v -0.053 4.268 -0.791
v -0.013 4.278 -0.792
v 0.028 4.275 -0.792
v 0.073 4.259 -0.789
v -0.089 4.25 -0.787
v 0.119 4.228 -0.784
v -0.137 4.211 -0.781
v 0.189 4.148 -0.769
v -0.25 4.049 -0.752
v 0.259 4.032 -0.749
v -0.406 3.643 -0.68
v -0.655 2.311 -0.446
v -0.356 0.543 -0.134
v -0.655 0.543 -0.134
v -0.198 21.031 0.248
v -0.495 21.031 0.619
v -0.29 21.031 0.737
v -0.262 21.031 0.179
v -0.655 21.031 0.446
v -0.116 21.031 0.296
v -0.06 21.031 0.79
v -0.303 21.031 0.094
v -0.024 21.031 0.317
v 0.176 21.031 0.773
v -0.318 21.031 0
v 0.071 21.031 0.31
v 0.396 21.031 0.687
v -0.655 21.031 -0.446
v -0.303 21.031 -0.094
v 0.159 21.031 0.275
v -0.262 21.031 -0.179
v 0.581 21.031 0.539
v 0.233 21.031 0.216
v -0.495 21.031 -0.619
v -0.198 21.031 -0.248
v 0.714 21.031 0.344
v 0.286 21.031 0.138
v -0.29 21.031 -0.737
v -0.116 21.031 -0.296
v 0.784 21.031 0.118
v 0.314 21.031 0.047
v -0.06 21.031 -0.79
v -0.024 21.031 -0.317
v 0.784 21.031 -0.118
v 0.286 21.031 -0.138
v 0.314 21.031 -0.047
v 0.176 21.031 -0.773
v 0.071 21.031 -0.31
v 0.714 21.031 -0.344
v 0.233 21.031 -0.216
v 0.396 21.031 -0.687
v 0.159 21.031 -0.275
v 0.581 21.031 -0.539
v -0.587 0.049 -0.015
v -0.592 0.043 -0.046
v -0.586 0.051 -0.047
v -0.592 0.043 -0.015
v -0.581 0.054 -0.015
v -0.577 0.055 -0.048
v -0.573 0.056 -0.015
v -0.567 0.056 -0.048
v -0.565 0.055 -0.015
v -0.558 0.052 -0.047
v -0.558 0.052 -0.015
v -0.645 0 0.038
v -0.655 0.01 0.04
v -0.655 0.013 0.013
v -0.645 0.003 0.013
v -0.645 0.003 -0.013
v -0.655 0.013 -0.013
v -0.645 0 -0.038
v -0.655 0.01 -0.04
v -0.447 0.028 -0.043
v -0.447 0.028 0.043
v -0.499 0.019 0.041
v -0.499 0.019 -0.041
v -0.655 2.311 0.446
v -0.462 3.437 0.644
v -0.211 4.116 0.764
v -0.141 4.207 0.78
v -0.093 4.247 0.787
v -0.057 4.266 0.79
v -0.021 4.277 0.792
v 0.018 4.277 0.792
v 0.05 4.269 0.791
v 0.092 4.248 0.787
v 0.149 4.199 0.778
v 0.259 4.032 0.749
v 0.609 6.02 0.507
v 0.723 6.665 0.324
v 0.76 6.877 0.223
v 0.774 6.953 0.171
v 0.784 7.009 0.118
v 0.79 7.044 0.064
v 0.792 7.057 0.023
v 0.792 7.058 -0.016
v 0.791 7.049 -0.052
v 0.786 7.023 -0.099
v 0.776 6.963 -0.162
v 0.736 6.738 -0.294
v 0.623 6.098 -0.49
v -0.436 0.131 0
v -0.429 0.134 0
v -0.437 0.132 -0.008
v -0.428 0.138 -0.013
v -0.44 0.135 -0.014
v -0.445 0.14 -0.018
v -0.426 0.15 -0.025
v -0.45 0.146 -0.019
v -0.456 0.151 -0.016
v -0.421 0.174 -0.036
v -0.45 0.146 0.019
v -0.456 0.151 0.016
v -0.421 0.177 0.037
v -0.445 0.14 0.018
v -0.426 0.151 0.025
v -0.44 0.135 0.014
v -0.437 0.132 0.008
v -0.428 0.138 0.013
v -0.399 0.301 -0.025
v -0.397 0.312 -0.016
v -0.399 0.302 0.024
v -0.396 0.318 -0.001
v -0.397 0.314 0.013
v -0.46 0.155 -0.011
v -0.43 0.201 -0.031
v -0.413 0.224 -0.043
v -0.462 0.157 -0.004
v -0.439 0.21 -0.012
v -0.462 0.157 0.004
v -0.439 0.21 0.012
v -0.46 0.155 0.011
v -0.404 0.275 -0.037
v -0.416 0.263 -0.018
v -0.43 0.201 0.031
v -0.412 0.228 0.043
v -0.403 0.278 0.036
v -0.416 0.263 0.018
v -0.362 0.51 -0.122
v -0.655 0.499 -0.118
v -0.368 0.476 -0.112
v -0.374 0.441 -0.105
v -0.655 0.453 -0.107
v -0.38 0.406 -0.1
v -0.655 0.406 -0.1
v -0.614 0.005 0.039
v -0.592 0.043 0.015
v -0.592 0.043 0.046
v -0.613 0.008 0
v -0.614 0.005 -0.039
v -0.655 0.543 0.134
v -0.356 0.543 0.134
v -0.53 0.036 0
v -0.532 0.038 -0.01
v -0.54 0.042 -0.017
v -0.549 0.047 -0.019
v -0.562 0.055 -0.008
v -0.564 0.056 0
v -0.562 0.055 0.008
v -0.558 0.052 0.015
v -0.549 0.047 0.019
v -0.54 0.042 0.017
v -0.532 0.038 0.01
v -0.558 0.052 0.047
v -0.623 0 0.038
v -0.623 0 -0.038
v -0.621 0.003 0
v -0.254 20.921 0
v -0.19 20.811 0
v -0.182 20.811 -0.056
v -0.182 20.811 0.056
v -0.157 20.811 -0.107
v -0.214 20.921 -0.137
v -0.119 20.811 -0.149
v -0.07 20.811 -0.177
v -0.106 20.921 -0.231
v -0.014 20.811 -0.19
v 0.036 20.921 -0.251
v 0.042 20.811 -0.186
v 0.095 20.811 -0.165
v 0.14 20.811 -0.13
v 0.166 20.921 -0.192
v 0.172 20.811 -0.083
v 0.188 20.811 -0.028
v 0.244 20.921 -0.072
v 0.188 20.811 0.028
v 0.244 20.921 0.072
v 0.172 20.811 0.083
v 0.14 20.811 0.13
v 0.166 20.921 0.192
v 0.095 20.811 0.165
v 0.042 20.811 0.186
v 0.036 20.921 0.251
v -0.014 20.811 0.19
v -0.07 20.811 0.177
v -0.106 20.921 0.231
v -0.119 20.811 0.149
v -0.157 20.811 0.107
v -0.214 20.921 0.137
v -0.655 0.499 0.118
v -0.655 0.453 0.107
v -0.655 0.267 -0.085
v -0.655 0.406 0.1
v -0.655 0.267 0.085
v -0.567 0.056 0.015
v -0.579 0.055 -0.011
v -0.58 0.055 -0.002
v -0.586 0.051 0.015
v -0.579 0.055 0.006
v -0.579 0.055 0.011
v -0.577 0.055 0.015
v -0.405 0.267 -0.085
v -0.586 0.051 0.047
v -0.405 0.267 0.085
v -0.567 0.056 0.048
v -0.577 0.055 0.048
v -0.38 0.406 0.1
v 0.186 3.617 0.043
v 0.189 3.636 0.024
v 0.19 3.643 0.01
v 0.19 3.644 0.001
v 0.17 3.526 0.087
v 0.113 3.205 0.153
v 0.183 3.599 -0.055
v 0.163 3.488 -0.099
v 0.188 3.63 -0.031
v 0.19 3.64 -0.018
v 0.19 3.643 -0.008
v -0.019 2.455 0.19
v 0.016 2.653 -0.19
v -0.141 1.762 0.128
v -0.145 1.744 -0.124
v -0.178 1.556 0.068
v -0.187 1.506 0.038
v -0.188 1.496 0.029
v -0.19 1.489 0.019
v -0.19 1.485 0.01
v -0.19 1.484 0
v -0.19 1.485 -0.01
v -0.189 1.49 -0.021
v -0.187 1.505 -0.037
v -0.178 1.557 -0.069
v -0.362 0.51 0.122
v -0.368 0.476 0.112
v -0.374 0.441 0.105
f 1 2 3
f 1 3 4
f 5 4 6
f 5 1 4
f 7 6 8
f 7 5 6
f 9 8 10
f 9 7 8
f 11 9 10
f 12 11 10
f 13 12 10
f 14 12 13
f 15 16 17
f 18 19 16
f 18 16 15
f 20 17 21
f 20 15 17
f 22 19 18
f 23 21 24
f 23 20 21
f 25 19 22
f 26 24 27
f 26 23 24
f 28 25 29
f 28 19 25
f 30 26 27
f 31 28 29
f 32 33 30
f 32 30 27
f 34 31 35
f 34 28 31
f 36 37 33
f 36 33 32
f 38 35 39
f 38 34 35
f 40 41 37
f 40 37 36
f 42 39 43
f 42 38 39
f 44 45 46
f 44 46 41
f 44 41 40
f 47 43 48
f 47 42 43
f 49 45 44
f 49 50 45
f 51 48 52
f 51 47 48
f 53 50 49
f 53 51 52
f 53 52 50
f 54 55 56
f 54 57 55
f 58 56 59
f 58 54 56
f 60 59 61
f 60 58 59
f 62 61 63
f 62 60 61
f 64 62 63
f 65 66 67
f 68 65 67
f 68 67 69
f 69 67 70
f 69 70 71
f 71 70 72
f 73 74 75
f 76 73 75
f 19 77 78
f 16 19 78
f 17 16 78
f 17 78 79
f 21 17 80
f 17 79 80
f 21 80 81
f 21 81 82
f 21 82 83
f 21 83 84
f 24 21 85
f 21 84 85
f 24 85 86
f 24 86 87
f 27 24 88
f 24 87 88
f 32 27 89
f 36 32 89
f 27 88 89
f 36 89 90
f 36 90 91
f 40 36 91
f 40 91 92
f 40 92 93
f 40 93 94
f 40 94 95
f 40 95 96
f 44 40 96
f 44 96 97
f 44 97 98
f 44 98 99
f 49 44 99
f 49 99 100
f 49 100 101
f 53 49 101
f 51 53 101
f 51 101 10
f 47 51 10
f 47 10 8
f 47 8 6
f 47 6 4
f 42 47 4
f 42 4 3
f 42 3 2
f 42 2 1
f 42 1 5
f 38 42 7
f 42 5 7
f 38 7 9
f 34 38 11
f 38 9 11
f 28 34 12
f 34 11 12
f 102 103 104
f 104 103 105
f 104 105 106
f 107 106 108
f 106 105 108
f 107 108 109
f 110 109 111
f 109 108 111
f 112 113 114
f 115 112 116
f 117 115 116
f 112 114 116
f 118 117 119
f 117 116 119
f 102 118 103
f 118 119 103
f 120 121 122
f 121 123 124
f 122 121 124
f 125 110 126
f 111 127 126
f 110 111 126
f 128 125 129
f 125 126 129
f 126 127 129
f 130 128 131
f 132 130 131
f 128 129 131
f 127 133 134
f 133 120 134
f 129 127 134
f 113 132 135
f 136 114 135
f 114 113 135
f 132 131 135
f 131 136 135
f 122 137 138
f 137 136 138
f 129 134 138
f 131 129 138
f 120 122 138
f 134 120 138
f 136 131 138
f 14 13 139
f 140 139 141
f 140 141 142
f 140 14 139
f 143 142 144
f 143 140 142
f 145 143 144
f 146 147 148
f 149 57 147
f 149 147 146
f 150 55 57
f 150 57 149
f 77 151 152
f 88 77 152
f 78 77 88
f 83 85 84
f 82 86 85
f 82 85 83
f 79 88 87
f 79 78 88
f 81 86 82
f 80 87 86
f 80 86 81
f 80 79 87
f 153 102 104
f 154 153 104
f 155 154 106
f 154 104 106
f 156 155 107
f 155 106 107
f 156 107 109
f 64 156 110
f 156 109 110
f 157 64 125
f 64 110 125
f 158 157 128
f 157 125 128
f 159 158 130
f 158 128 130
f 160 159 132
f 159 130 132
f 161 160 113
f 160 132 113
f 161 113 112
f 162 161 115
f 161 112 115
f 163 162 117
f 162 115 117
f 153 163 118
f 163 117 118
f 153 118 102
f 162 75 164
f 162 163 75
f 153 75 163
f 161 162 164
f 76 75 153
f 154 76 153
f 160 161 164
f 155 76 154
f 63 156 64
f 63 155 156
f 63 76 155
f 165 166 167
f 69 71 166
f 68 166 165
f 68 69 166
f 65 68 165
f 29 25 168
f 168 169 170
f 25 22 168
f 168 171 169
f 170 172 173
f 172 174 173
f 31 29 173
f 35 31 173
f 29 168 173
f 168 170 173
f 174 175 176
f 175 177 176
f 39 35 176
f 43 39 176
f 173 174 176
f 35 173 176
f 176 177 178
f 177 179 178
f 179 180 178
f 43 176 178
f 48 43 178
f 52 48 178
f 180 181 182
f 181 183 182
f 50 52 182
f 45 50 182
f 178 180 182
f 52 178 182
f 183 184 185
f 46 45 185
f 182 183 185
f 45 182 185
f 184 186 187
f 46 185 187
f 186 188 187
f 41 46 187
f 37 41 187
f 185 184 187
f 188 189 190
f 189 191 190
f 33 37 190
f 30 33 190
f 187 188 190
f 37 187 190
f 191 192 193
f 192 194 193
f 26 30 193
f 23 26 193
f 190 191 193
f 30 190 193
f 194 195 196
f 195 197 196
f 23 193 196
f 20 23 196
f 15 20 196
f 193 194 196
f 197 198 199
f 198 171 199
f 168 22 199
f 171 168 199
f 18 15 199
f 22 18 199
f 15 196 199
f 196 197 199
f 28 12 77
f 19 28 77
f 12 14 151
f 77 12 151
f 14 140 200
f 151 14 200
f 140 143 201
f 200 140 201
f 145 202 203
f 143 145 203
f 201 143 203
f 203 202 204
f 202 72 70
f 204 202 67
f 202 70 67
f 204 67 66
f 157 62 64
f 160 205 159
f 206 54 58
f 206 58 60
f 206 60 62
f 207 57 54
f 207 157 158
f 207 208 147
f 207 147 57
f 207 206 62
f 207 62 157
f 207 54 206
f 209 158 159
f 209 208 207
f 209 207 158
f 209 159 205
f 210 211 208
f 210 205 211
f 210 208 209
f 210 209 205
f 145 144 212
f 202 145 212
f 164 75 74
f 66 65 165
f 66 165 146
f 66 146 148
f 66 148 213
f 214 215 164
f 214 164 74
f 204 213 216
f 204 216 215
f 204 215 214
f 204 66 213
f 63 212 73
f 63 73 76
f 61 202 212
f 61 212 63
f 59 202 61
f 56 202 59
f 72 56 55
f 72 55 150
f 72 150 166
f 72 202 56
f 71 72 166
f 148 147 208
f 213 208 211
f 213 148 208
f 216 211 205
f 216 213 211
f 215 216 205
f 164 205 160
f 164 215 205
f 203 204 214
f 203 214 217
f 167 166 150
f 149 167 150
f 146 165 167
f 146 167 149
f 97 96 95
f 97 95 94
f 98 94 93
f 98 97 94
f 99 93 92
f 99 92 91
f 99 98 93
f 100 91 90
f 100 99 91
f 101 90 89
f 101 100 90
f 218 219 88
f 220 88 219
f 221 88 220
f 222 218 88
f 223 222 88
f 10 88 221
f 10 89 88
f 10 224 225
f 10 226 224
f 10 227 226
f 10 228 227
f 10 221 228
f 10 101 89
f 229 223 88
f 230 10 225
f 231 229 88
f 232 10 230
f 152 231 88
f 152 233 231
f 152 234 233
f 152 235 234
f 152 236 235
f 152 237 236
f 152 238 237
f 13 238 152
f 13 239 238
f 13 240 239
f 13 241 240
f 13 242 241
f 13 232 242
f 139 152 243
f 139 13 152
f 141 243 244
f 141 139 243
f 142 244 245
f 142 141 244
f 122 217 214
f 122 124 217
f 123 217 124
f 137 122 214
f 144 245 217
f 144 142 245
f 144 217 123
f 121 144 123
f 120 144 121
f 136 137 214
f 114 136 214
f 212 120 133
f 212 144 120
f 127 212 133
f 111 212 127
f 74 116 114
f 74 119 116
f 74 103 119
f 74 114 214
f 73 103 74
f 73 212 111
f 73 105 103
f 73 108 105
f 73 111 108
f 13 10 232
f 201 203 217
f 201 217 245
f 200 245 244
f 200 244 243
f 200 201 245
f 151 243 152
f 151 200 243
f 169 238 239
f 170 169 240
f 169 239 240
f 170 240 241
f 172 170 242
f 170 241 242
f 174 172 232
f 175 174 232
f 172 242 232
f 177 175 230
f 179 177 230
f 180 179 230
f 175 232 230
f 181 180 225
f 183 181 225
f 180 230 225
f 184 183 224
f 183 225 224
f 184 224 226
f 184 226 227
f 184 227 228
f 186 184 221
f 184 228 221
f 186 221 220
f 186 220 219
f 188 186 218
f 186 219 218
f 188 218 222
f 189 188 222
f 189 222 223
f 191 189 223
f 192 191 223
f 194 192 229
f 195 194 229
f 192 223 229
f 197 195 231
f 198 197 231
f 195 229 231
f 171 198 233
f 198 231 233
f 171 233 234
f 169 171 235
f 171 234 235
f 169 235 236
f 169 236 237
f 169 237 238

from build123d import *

# Parameters (mm, degrees)
TD_STD_FEATURE_DEPTH            = 21.0312
ISA_STD_FEATURE_DEPTH           = 22.061040395498036
ISA_STD_FEATURE_DEPTH_BACK      = 22.061040395498036
BA_STD_FEATURE_DEPTH            = 22.061040395498036
BA_STD_FEATURE_DEPTH_BACK       = 22.061040395498036
VR_STD_FEATURE_DEPTH            = 22.061040395498036
VR_STD_FEATURE_DEPTH_BACK       = 22.061040395498036
ND_STD_FEATURE_DEPTH            = 22.061040395498036
ND_STD_FEATURE_DEPTH_BACK       = 22.061040395498036
HOLE_STD_FEATURE_D              = 0.381
HOLE_STD_FEATURE_CSINK_D        = 0.635
HOLE_STD_FEATURE_CSINK_ANGLE    = 60
STD_HOLE_CUT_FEATURE_DEPTH      = 22.158574025318714
STD_HOLE_CUT_FEATURE_DEPTH_BACK = 22.158574025318714
NR_FEATURE_R                    = 0.0254
STD_C_FEATURE_DEPTH             = 22.061040395498036
STD_C_FEATURE_DEPTH_BACK        = 22.061040395498036
STD_FR_C_FEATURE_R              = 0.01016
STD_BR_C_FEATURE_R              = 0.01016


with BuildPart() as part:
    # td_std_sketch → td_std_feature (new body)
    with BuildSketch(Plane(origin=(0, 0, 0), x_dir=(1, 0, 0), z_dir=(0, 1, 0))):
        with BuildLine():
            Line((-0.65532, 0.4456234374446657), (-0.6553199999999998, -0.44562343744466604))
            ThreePointArc((-0.6553199999999998, -0.44562343744466604), (0.79248, 0), (-0.65532, 0.4456234374446657))
        make_face()
    extrude(amount=TD_STD_FEATURE_DEPTH)

    # isa_std_sketch → isa_std_feature (cut, two sides: drawn at the far end of the back side and taken through both)
    with BuildSketch(Plane(origin=(0, 0, 0), x_dir=(0, 0, -1), z_dir=(1, 0, 0)).offset(-ISA_STD_FEATURE_DEPTH_BACK)):
        Polygon((8.373162888528082, 47.27049062508045), (0.79248, 4.278301579083286), (0.03809999999999999, 0), (-0.03809999999999999, 0), (-0.79248, 4.278301579083286), (-8.373162888528082, 47.27049062508045), (-8.373162888528082, -40.04033509597618), (8.373162888528082, -40.04033509597618), align=None)
    extrude(amount=ISA_STD_FEATURE_DEPTH + ISA_STD_FEATURE_DEPTH_BACK, mode=Mode.SUBTRACT)

    # ba_std_sketch → ba_std_feature (cut, two sides: drawn at the far end of the back side and taken through both)
    with BuildSketch(Plane.XY.offset(-BA_STD_FEATURE_DEPTH_BACK)):
        Polygon((-51.96869655836785, -9.056666233848073), (-0.6057899999999999, 0), (-0.4471889008518133, 0.02796565294984382), (0.79248, 7.0584773526961735), (9.849146233848053, 58.421383911064034), (86.76310584868799, -12.040863498073982), (24.945263056472086, -79.51891364298609), align=None)
    extrude(amount=BA_STD_FEATURE_DEPTH + BA_STD_FEATURE_DEPTH_BACK, mode=Mode.SUBTRACT)

    # vr_std_sketch → vr_std_feature (cut, two sides: drawn at the far end of the back side and taken through both)
    with BuildSketch(Plane(origin=(0, 0, 0), x_dir=(0, 0, -1), z_dir=(1, 0, 0)).offset(-VR_STD_FEATURE_DEPTH_BACK)):
        with BuildLine():
            Line((35.91518958962539, 36.381828135911775), (0.79248, 1.2591185462865075))
            Line((0.79248, 1.2591185462865075), (0.24587123921628848, 0.7125097855027981))
            ThreePointArc((0.24587123921628848, 0.7125097855027981), (0.14656815960932523, 0.5719991778386461), (0.09986436121197133, 0.40640000000000004))
            Line((0.09986436121197133, 0.40640000000000004), (0.05714999999999999, 0))
            Line((0.05714999999999999, 0), (-0.05714999999999999, 0))
            Line((-0.05714999999999999, 0), (-0.09986436121197133, 0.40640000000000004))
            ThreePointArc((-0.09986436121197133, 0.40640000000000004), (-0.14656815960932523, 0.5719991778386461), (-0.24587123921628848, 0.7125097855027981))
            Line((-0.24587123921628848, 0.7125097855027981), (-0.79248, 1.2591185462865075))
            Line((-0.79248, 1.2591185462865075), (-35.91518958962539, 36.381828135911775))
            Line((-35.91518958962539, 36.381828135911775), (-35.91518958962539, -62.96019636196763))
            Line((-35.91518958962539, -62.96019636196763), (35.91518958962539, -62.96019636196763))
            Line((35.91518958962539, -62.96019636196763), (35.91518958962539, 36.381828135911775))
        make_face()
    extrude(amount=VR_STD_FEATURE_DEPTH + VR_STD_FEATURE_DEPTH_BACK, mode=Mode.SUBTRACT)

    # nd_std_sketch → nd_std_feature (cut, two sides: drawn at the far end of the back side and taken through both)
    with BuildSketch(Plane.XY.offset(-ND_STD_FEATURE_DEPTH_BACK)):
        Polygon((-26.695612432299043, -45.16910067246157), (-0.6172199999999999, 0), (-0.5795900153763918, 0.06517704525612475), (-0.49309651581291747, 0.01523999999999999), (44.67600415664865, -26.06315243229904), (71.65060635143378, -126.82868059585769), (0.27898976248608776, -145.93462883602024), align=None)
    extrude(amount=ND_STD_FEATURE_DEPTH + ND_STD_FEATURE_DEPTH_BACK, mode=Mode.SUBTRACT)

    # hole_std_feature (through all)
    with Locations(Plane(origin=(0, 21.0312, 0), x_dir=(1, 0, 0), z_dir=(0, 1, 0))):
        with Locations((0, 0)):
            CounterSinkHole(HOLE_STD_FEATURE_D / 2, HOLE_STD_FEATURE_CSINK_D / 2, counter_sink_angle=HOLE_STD_FEATURE_CSINK_ANGLE)


with BuildPart() as body_2:
    # std_hole_sketch → std_hole_feature (revolve)
    with BuildSketch(Plane.XY):
        Polygon((2.0643967957346323, 1.16621487026174), (1.318693364519402, 1.9119183014769674), (-0.6066953211391621, -0.01347038418160373), (-0.5932249369575584, -0.02694076836320745), (-0.43560320426536, 0.13068096432899157), align=None)
    revolve(axis=Axis((-0.6066953211391621, -0.01347038418160373, 0), (0.7071067811865462, 0.7071067811865488, 0)))

    # std_hole_cut_sketch → std_hole_cut_feature (cut, two sides: drawn at the far end of the back side and taken through both)
    with BuildSketch(Plane.XY.offset(-STD_HOLE_CUT_FEATURE_DEPTH_BACK)):
        Polygon((-45.98482601113434, 26.27990227002553), (-0.6553199999999999, 0.1088997722642913), (-0.557592970120267, 0.05247704525612475), (-0.49309651581291747, 0.01523999999999999), (44.83640949532142, -26.155762497761245), (-7.505595500201061, -116.81477452002991), (-98.32683100665682, -64.37910975224314), align=None)
    extrude(amount=STD_HOLE_CUT_FEATURE_DEPTH + STD_HOLE_CUT_FEATURE_DEPTH_BACK, mode=Mode.SUBTRACT)


with BuildPart() as part_1:
    add(part.part)

    # std_hole_combine: cut body 2
    add(body_2.part, mode=Mode.SUBTRACT)

    # nr_feature
    nr_feature_edges = [part_1.edges().sort_by_distance(p)[0] for p in [
        (-0.5795900153763918, 0.06517704525612475, 0),
    ]]
    fillet(nr_feature_edges, radius=NR_FEATURE_R)

    # std_c_sketch → std_c_feature (cut, two sides: drawn at the far end of the back side and taken through both)
    with BuildSketch(Plane(origin=(0, 0, 0), x_dir=(0, 0, -1), z_dir=(1, 0, 0)).offset(-STD_C_FEATURE_DEPTH_BACK)):
        with BuildLine():
            Line((51.47071118925243, -8.282224024034191), (0.03810000000000001, -3e-17))
            ThreePointArc((0.03810000000000001, -3e-17), (1e-17, 0.00304799999999997), (-0.03809999999999998, -3e-17))
            Line((-0.03809999999999998, -3e-17), (-51.47071118925243, -8.282224024034191))
            Line((-51.47071118925243, -8.282224024034191), (-51.47071118925243, -112.47260224638451))
            Line((-51.47071118925243, -112.47260224638451), (51.47071118925243, -112.47260224638451))
            Line((51.47071118925243, -112.47260224638451), (51.47071118925243, -8.282224024034191))
        make_face()
    extrude(amount=STD_C_FEATURE_DEPTH + STD_C_FEATURE_DEPTH_BACK, mode=Mode.SUBTRACT)

    # std_fr_c_feature
    std_fr_c_feature_edges = [part_1.edges().sort_by_distance(p)[0] for p in [
        (-0.6553199999999999, 0.003048, 7e-17),
    ]]
    fillet(std_fr_c_feature_edges, radius=STD_FR_C_FEATURE_R)

    # std_br_c_feature
    std_br_c_feature_edges = [part_1.edges().sort_by_distance(p)[0] for p in [
        (-0.6154602363795091, 0.00304799999999997, 2e-17),
    ]]
    fillet(std_br_c_feature_edges, radius=STD_BR_C_FEATURE_R)


solid = part_1.part
